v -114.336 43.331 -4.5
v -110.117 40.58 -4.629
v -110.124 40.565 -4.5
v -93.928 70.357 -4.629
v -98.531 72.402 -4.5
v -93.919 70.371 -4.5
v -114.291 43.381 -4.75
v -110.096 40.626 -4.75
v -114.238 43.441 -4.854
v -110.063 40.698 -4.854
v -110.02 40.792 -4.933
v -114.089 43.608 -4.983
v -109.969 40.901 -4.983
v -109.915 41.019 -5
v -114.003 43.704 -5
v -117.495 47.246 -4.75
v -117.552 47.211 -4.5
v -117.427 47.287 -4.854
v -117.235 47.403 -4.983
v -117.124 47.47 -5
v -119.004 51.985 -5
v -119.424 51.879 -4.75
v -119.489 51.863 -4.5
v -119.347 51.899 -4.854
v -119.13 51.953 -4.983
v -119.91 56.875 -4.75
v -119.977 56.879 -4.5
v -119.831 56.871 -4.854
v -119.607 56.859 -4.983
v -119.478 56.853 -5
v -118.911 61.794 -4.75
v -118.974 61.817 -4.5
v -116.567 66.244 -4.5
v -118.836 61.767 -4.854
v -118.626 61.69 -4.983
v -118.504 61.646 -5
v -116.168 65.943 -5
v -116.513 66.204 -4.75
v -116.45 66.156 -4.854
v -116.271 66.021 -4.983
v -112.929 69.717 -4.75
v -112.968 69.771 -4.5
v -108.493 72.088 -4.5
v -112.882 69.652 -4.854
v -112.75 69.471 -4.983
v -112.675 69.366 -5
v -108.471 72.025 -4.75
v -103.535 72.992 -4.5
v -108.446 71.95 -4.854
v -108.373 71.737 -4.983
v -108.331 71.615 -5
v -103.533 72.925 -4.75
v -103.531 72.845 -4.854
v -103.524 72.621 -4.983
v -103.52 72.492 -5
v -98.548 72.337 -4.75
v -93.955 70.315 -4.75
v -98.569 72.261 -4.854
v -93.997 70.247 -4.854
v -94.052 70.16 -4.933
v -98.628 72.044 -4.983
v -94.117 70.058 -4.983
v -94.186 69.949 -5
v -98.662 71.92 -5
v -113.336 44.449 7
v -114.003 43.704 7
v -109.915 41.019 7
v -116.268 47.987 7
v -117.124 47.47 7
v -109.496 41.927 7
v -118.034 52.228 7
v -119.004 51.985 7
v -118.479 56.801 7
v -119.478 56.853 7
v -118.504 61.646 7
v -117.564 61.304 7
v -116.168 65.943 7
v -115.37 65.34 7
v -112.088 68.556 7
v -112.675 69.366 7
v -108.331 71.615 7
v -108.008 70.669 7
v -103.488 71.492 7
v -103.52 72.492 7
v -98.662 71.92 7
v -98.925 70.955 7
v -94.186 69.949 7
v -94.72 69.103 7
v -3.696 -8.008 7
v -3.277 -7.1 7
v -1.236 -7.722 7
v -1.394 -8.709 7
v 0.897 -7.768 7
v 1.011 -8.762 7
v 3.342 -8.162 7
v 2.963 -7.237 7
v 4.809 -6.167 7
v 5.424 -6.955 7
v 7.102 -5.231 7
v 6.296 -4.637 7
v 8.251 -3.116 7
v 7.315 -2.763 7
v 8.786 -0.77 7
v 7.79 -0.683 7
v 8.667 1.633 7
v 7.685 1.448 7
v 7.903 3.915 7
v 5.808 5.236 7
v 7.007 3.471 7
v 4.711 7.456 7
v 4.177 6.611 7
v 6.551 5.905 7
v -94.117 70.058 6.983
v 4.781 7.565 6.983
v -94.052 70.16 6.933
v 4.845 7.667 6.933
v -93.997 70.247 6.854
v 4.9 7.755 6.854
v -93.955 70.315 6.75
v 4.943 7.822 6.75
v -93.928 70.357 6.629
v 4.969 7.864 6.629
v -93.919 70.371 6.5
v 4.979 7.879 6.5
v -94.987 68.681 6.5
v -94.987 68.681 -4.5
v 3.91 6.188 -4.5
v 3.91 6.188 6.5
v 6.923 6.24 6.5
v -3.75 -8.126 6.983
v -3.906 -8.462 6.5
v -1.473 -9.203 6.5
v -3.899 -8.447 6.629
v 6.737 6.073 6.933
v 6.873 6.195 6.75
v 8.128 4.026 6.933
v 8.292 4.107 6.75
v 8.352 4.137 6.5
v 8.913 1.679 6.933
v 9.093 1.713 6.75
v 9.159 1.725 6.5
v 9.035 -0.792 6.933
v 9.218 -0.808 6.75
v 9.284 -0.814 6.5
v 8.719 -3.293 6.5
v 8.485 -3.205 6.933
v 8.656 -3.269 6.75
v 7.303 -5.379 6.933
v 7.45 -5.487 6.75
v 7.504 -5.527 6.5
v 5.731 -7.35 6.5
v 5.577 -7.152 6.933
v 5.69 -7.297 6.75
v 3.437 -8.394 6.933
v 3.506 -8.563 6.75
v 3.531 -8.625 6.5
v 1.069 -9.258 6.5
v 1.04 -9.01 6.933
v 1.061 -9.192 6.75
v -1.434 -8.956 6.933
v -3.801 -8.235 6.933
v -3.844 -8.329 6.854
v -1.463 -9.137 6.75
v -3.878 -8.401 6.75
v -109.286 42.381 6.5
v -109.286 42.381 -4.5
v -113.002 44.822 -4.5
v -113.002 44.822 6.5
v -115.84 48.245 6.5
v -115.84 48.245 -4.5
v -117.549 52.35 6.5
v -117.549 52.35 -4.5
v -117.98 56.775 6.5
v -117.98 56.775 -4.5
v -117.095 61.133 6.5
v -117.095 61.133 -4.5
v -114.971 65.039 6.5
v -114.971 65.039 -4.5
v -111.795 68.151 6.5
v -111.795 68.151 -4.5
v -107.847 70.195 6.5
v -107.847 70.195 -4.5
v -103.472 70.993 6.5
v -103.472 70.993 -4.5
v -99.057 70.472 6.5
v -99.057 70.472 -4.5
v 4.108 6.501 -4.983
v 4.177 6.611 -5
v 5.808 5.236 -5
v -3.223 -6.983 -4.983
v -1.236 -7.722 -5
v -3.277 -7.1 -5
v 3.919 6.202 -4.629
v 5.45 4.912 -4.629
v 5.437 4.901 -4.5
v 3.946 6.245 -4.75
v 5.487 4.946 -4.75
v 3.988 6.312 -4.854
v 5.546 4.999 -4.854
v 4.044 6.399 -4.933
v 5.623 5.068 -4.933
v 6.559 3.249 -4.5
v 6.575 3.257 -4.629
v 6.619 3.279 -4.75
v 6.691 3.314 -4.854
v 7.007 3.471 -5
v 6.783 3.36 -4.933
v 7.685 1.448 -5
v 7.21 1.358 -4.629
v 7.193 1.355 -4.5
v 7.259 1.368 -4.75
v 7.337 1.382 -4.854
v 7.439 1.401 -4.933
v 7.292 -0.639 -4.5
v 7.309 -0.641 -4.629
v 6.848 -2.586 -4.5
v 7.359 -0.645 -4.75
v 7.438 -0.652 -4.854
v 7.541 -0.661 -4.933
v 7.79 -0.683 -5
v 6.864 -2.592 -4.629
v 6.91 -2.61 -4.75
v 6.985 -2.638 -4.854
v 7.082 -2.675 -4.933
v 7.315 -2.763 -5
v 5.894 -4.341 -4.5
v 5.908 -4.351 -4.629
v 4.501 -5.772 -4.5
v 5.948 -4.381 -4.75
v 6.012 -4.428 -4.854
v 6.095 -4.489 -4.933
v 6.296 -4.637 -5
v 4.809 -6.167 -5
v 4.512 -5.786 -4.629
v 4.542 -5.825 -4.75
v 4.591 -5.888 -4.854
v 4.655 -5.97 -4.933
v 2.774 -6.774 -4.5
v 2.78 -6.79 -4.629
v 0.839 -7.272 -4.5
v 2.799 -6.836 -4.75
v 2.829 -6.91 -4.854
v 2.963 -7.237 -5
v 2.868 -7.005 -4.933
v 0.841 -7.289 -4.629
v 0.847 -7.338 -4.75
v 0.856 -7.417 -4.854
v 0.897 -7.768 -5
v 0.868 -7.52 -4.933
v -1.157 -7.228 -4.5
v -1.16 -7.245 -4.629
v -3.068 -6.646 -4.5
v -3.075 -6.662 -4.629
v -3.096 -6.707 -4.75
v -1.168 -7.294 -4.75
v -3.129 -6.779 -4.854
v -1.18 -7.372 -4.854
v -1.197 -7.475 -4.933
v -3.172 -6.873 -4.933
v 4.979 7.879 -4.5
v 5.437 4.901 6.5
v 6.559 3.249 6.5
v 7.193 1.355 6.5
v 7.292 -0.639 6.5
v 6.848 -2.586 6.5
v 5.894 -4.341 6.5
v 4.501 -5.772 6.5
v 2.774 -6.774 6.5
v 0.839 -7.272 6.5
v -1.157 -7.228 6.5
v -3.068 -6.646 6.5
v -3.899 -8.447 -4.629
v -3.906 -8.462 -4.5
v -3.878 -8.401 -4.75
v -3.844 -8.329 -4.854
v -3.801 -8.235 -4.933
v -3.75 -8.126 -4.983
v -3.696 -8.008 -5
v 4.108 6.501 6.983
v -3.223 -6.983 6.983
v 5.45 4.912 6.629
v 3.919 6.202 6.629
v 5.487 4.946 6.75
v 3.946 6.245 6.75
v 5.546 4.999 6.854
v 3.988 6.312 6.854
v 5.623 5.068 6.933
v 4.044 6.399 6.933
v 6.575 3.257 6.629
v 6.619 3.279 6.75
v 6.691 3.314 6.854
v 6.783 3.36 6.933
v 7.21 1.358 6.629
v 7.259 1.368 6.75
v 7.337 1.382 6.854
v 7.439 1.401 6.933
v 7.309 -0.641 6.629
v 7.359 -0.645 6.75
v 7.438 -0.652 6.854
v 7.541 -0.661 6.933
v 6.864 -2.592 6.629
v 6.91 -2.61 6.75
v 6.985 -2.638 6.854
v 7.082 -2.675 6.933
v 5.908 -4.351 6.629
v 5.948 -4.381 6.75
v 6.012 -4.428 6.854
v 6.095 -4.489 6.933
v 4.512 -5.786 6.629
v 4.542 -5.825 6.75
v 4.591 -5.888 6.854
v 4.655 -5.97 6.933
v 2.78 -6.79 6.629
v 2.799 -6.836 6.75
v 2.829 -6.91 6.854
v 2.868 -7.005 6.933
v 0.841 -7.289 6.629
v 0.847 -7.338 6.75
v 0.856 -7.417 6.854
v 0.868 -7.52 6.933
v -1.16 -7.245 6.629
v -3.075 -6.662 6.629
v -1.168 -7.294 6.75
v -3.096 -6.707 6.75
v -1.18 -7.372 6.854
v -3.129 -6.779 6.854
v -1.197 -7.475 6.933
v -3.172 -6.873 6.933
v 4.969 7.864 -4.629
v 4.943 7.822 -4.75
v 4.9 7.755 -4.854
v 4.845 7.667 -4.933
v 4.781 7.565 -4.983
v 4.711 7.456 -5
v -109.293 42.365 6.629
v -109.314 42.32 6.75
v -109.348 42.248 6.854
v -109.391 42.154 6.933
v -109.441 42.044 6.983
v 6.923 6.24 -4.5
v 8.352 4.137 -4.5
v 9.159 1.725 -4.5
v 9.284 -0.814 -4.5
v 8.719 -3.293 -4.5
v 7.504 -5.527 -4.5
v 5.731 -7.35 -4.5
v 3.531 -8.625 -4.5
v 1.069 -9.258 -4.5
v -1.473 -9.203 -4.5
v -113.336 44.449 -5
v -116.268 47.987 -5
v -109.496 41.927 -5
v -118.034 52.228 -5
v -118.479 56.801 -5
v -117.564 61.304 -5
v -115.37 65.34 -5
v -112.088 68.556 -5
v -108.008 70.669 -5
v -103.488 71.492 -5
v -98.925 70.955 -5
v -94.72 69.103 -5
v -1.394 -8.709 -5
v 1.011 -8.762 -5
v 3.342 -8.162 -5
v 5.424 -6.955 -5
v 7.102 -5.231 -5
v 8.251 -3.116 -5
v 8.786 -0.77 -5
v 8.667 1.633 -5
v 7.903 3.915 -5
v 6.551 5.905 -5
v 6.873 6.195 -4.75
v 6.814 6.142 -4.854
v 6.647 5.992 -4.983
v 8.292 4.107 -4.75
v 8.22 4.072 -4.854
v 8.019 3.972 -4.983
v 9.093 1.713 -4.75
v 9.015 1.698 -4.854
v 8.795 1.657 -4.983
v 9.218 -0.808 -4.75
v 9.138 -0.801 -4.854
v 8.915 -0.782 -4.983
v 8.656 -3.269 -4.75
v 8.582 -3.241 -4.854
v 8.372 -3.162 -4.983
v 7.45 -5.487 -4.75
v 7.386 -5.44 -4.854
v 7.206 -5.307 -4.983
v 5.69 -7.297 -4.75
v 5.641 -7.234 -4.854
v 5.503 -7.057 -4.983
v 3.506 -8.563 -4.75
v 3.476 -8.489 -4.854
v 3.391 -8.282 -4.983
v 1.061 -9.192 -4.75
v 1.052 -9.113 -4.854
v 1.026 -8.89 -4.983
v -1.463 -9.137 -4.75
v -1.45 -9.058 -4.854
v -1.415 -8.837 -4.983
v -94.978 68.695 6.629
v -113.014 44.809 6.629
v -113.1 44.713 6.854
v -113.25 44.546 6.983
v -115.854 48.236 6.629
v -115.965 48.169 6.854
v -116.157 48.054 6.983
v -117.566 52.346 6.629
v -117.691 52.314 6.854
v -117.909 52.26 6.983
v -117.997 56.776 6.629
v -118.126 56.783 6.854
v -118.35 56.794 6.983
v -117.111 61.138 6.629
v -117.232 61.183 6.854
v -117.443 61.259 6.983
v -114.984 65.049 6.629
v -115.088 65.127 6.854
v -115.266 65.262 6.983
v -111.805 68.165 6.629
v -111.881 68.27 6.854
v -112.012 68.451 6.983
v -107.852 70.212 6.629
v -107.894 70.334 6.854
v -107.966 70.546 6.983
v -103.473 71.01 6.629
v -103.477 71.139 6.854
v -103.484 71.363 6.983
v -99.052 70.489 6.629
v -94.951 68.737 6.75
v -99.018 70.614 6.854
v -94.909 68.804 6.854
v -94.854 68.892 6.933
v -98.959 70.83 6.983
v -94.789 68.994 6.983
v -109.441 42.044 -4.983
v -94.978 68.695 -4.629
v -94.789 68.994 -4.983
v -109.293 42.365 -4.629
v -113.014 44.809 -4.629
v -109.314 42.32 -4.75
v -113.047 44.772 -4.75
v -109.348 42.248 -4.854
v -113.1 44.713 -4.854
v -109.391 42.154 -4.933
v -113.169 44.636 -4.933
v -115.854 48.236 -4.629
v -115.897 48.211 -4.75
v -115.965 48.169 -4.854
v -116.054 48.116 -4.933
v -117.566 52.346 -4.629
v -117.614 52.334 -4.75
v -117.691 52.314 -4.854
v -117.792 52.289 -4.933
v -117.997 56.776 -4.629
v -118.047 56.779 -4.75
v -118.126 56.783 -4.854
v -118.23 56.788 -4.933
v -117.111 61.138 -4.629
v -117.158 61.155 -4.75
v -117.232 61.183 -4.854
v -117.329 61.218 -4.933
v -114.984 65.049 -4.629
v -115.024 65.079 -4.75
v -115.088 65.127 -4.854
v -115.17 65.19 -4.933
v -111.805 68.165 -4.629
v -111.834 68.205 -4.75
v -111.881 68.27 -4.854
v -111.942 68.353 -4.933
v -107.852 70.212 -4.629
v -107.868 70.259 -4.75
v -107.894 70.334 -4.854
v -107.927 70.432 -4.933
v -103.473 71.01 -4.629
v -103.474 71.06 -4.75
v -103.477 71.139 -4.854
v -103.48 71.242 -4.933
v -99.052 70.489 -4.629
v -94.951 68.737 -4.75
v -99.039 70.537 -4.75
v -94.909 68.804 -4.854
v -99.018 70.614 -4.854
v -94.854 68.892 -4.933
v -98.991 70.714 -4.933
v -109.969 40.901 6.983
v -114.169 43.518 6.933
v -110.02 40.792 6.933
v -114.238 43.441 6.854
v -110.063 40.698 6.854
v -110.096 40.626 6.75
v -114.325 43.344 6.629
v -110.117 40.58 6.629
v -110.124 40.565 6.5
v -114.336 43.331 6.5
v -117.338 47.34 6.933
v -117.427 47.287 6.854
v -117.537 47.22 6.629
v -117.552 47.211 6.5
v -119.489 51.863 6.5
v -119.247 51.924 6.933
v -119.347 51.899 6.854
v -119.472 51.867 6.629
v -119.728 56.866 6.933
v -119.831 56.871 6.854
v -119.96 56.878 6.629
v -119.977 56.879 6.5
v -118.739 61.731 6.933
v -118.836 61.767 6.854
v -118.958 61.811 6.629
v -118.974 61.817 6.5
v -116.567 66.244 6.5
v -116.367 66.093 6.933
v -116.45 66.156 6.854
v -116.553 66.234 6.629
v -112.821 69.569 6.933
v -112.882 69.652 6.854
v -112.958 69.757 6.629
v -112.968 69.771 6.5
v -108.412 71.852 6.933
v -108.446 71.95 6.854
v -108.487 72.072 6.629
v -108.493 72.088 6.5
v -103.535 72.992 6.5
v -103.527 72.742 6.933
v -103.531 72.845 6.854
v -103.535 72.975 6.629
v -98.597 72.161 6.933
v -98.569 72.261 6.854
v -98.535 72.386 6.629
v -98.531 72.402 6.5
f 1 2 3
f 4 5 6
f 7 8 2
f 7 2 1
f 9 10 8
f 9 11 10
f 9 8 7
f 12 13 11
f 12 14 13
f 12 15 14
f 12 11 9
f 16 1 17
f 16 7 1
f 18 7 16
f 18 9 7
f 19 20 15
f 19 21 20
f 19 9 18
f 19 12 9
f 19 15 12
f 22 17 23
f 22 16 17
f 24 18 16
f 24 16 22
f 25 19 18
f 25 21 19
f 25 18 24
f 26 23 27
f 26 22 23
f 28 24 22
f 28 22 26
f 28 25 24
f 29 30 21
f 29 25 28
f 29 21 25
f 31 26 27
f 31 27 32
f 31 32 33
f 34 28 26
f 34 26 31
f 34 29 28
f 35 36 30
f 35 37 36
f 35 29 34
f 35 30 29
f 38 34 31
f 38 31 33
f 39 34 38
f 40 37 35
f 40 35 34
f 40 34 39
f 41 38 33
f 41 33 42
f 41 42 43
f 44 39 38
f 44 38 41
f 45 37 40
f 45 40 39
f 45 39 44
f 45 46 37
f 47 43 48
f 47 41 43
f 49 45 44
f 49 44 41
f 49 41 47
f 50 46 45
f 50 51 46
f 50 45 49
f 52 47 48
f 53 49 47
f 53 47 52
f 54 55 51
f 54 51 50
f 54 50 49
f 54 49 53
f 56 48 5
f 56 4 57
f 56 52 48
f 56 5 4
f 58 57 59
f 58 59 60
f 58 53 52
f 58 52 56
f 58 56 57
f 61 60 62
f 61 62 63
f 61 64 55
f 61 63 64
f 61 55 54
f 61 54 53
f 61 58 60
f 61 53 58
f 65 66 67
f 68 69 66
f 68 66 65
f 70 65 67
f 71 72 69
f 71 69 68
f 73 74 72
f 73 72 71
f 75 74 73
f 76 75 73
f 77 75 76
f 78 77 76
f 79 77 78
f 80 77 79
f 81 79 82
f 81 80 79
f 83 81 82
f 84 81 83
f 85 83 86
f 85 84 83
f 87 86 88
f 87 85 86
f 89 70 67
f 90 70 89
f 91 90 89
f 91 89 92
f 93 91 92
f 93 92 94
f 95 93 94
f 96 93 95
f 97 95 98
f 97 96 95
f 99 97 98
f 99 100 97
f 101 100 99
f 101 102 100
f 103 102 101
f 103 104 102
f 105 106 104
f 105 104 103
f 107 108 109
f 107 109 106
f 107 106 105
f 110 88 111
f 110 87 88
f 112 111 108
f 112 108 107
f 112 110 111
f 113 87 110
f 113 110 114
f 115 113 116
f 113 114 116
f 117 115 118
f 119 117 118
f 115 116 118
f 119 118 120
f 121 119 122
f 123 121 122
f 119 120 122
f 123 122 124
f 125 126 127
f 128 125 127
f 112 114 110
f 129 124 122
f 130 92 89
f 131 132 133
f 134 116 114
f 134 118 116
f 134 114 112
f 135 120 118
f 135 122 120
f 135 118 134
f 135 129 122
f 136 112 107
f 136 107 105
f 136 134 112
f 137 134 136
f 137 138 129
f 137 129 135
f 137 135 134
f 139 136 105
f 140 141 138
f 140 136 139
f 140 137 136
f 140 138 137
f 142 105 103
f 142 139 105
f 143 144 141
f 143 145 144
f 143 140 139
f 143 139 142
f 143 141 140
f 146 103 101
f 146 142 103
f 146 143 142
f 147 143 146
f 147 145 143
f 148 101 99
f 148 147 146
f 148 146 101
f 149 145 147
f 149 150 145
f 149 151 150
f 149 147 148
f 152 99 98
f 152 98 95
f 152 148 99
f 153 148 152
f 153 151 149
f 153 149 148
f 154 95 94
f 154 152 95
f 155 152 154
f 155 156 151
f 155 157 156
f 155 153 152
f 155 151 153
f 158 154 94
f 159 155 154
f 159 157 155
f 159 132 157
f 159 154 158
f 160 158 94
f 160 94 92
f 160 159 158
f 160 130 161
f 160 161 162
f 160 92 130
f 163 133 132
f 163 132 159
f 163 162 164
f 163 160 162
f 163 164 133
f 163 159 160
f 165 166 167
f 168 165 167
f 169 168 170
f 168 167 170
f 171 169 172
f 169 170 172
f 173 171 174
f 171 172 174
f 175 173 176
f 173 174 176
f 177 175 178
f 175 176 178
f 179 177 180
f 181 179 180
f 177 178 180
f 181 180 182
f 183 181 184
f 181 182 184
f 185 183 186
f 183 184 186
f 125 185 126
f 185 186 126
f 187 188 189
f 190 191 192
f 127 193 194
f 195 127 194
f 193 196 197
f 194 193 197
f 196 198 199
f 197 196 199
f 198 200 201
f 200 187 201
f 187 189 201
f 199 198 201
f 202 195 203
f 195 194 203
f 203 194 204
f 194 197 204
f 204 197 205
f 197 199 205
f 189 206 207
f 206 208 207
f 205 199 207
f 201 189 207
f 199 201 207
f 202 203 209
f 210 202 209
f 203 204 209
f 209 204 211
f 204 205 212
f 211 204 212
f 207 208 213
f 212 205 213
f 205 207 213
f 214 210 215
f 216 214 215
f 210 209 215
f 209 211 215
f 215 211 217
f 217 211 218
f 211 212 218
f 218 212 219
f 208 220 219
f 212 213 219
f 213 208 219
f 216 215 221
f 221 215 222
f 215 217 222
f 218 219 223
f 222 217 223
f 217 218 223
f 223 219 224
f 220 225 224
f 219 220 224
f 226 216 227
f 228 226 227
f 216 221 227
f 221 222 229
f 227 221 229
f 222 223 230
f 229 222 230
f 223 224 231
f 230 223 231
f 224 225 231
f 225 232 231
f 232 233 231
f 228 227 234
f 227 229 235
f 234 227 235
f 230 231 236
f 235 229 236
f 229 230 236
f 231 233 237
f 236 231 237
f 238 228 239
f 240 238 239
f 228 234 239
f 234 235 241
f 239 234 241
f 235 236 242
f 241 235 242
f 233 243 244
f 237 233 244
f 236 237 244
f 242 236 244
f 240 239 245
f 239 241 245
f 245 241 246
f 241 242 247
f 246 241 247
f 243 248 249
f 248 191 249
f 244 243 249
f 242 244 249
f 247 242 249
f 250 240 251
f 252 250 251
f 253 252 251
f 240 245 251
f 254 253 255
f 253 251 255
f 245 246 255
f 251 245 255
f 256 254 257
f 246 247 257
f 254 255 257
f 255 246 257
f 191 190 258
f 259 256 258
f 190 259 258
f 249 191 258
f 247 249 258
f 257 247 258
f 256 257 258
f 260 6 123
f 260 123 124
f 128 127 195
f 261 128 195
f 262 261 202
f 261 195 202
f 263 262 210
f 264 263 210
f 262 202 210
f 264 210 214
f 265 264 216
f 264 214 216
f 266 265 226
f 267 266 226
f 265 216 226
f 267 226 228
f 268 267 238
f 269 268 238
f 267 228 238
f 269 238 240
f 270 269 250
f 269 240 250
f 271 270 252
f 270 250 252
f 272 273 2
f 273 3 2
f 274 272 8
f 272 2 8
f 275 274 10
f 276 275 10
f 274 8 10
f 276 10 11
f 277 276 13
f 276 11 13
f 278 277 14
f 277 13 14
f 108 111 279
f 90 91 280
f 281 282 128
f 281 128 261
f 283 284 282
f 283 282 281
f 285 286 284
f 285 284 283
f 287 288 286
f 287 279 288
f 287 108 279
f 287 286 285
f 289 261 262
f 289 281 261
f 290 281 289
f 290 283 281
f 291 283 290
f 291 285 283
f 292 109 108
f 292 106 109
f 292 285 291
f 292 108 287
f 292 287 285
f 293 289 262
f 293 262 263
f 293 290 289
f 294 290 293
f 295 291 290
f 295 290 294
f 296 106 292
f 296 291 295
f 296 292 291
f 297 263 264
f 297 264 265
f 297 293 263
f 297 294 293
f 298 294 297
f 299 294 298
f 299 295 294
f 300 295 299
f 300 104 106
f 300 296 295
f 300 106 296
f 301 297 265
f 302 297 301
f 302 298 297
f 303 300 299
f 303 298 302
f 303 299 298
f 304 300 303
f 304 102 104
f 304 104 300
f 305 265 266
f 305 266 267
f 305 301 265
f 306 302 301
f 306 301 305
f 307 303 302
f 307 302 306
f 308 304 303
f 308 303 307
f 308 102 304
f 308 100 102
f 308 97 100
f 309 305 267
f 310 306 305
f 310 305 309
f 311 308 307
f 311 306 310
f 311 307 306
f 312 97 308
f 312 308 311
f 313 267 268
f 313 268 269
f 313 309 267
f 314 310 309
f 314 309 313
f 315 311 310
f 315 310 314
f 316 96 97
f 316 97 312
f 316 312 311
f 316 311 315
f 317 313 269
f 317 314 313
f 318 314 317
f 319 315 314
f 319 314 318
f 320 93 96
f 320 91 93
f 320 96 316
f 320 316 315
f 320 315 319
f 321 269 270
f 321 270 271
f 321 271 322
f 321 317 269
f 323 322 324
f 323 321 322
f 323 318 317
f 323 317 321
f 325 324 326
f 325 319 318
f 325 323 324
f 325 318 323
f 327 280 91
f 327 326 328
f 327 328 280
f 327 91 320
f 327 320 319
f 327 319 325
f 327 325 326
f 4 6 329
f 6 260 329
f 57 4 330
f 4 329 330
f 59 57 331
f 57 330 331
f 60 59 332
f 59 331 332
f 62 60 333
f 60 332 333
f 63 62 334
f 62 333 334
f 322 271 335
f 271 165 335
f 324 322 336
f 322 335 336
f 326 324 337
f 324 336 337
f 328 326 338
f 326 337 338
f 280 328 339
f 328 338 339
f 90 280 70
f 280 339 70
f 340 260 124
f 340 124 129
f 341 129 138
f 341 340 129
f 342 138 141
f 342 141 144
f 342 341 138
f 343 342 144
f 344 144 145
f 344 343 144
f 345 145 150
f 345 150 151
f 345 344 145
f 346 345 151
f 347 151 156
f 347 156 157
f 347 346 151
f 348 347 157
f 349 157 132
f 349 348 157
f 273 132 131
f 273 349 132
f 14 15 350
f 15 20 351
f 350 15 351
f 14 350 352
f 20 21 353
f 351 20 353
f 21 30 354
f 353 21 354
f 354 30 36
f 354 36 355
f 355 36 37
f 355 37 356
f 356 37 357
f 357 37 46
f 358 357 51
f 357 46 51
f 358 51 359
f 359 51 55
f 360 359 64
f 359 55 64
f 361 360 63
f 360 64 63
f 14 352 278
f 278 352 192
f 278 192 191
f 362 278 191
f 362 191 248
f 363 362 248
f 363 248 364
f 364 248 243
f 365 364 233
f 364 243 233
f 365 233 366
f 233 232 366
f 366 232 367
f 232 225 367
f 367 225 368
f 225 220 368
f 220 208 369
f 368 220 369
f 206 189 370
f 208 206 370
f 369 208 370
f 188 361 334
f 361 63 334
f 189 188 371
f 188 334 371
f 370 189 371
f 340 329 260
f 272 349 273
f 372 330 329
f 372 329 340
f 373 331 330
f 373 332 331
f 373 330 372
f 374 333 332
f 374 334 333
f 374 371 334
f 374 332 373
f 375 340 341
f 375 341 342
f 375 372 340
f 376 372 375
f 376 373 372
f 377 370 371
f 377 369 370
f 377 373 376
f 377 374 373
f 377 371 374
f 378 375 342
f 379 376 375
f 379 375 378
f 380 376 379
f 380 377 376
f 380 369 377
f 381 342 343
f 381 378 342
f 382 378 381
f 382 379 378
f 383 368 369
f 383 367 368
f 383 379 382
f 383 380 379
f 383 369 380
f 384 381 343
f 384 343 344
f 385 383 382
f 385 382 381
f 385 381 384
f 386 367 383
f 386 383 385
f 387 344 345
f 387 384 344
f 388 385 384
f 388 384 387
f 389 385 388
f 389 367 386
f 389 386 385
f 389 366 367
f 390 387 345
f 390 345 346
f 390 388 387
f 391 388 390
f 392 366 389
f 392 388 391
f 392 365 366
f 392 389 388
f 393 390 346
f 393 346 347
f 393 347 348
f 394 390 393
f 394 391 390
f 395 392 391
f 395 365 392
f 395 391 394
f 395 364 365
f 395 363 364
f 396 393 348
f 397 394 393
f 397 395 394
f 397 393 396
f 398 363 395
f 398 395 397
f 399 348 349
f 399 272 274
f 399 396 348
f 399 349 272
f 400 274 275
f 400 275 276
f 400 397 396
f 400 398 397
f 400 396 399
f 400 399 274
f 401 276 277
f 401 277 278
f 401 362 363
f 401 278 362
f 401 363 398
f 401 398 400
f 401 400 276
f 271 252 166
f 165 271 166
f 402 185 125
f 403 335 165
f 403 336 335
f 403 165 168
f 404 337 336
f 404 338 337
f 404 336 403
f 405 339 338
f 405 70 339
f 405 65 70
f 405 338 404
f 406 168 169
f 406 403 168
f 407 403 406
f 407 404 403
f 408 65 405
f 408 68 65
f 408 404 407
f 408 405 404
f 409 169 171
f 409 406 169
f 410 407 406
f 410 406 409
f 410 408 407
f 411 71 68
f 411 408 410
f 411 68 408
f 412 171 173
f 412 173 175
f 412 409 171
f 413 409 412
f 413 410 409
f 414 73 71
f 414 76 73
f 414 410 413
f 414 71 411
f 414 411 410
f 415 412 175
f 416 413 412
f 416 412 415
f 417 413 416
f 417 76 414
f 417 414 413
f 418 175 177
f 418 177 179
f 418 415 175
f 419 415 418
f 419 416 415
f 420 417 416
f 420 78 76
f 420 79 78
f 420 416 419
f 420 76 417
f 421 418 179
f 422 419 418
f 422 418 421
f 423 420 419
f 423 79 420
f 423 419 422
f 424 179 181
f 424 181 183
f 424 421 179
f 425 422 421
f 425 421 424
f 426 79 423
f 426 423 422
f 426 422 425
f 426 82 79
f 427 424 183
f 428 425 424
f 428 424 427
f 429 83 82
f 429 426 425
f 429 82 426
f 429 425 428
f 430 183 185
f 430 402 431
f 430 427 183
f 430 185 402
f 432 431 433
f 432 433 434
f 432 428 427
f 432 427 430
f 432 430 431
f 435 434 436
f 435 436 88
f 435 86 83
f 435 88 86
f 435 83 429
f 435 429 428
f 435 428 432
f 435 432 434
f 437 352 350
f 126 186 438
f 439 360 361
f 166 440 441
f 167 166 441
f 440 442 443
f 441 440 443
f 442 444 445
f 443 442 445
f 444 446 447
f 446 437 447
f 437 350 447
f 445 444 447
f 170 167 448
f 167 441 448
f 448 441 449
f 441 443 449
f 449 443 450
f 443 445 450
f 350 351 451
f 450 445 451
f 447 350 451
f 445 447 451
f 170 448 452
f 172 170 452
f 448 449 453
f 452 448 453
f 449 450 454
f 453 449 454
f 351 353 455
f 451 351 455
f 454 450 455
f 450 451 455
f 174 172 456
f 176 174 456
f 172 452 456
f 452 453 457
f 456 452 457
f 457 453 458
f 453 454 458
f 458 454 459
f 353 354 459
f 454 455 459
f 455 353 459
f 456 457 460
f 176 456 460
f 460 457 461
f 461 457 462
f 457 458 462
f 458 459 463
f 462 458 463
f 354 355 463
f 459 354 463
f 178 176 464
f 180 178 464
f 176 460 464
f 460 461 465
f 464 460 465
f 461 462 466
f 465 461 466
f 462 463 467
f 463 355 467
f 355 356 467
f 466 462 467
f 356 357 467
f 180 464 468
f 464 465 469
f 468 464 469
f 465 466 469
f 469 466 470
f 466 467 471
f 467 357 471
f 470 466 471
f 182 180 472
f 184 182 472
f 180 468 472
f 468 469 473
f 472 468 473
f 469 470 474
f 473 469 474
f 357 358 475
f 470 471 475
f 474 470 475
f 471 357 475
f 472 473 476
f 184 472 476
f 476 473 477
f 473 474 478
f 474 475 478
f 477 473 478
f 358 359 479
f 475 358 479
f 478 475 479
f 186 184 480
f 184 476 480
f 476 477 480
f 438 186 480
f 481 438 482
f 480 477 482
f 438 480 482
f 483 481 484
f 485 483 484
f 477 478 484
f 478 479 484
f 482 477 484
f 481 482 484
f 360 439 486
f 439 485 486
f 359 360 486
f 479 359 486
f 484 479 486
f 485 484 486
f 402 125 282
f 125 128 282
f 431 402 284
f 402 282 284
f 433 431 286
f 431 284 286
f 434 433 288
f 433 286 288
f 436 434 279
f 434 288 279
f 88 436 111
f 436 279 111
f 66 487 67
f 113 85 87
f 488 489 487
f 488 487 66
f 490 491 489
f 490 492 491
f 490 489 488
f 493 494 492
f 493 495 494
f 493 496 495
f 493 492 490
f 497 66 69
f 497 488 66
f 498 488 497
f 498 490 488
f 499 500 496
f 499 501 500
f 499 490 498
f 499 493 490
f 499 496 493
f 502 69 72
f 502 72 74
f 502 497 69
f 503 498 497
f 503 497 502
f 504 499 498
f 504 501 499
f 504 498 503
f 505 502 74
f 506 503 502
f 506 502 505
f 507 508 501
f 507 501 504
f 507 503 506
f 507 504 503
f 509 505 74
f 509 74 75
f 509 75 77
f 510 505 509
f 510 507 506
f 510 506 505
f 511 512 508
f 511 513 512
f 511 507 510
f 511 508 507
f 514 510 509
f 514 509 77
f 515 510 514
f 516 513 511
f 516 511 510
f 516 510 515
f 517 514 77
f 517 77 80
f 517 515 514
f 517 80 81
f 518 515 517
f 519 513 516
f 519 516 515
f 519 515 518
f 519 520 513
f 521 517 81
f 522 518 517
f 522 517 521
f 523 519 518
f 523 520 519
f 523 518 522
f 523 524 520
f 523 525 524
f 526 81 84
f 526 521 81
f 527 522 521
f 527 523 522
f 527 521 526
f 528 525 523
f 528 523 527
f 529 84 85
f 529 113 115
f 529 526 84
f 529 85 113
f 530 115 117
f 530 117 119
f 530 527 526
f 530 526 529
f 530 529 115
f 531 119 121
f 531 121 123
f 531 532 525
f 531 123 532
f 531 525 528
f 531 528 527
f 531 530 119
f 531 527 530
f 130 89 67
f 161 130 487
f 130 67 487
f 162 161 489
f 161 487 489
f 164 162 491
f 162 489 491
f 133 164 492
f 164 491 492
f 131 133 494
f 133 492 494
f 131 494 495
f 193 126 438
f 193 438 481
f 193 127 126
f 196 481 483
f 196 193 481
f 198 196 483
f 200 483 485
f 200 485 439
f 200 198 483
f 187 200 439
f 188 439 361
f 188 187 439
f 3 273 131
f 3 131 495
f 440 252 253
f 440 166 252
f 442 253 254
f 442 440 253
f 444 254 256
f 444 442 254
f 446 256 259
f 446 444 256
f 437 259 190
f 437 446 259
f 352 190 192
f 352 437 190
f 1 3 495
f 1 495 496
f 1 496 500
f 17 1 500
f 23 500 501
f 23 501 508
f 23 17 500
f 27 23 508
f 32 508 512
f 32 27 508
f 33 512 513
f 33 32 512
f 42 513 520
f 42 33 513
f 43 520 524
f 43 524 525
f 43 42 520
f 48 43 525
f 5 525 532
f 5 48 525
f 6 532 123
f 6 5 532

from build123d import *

# Parameters (mm, degrees)
SURFACE_EXTRUDE4_1_BACK  = 5
SURFACE_EXTRUDE4_1_DEPTH = 12
THICKEN3_T1              = 2
FILLET3_R                = 0.5


with BuildPart() as body_1:
    # Surface-Extrude4: a surface, the sketch's curves swept straight by 12 mm
    with BuildLine(Plane.XY.offset(-SURFACE_EXTRUDE4_1_BACK), mode=Mode.PRIVATE) as surface_extrude4_1_path:
        Line((-3.067605851, -6.646088585), (-109.286177334, 42.380749855))
        ThreePointArc((-109.286177334, 42.380749855), (-116.178200525, 63.164846887), (-94.987263263, 68.680538237))
        Line((-94.987263263, 68.680538237), (3.910153467, 6.188004445))
        ThreePointArc((3.910153467, 6.188004445), (6.430859787, -3.496389787), (-3.067605851, -6.646088585))
    surface_extrude4_1 = Shell.extrude(surface_extrude4_1_path.wire(), (0 * SURFACE_EXTRUDE4_1_DEPTH, 0 * SURFACE_EXTRUDE4_1_DEPTH, 1 * SURFACE_EXTRUDE4_1_DEPTH))
    add(Solid.thicken(surface_extrude4_1, THICKEN3_T1))

    # Fillet3
    fillet3_edges = [body_1.edges().sort_by_distance(p)[0] for p in [
        (6.430859787, -3.496389787, -5),
        (-56.176891592, 17.867330635, -5),
        (-116.178200525, 63.164846887, -5),
        (-45.538554898, 37.434271341, -5),
        (8.18795319, -4.451702705, 7),
        (-57.01504857, 16.051430615, 7),
        (-117.935293928, 64.120159806, 7),
        (-44.47019, 39.125009772, 7),
        (8.18795319, -4.451702705, -5),
        (-57.01504857, 16.051430615, -5),
        (-117.935293928, 64.120159806, -5),
        (-44.47019, 39.125009772, -5),
        (-45.538554898, 37.434271341, 7),
        (-116.178200525, 63.164846887, 7),
        (-56.176891592, 17.867330635, 7),
        (6.430859787, -3.496389787, 7),
    ]]
    fillet(fillet3_edges, radius=FILLET3_R)


solid = body_1.part
